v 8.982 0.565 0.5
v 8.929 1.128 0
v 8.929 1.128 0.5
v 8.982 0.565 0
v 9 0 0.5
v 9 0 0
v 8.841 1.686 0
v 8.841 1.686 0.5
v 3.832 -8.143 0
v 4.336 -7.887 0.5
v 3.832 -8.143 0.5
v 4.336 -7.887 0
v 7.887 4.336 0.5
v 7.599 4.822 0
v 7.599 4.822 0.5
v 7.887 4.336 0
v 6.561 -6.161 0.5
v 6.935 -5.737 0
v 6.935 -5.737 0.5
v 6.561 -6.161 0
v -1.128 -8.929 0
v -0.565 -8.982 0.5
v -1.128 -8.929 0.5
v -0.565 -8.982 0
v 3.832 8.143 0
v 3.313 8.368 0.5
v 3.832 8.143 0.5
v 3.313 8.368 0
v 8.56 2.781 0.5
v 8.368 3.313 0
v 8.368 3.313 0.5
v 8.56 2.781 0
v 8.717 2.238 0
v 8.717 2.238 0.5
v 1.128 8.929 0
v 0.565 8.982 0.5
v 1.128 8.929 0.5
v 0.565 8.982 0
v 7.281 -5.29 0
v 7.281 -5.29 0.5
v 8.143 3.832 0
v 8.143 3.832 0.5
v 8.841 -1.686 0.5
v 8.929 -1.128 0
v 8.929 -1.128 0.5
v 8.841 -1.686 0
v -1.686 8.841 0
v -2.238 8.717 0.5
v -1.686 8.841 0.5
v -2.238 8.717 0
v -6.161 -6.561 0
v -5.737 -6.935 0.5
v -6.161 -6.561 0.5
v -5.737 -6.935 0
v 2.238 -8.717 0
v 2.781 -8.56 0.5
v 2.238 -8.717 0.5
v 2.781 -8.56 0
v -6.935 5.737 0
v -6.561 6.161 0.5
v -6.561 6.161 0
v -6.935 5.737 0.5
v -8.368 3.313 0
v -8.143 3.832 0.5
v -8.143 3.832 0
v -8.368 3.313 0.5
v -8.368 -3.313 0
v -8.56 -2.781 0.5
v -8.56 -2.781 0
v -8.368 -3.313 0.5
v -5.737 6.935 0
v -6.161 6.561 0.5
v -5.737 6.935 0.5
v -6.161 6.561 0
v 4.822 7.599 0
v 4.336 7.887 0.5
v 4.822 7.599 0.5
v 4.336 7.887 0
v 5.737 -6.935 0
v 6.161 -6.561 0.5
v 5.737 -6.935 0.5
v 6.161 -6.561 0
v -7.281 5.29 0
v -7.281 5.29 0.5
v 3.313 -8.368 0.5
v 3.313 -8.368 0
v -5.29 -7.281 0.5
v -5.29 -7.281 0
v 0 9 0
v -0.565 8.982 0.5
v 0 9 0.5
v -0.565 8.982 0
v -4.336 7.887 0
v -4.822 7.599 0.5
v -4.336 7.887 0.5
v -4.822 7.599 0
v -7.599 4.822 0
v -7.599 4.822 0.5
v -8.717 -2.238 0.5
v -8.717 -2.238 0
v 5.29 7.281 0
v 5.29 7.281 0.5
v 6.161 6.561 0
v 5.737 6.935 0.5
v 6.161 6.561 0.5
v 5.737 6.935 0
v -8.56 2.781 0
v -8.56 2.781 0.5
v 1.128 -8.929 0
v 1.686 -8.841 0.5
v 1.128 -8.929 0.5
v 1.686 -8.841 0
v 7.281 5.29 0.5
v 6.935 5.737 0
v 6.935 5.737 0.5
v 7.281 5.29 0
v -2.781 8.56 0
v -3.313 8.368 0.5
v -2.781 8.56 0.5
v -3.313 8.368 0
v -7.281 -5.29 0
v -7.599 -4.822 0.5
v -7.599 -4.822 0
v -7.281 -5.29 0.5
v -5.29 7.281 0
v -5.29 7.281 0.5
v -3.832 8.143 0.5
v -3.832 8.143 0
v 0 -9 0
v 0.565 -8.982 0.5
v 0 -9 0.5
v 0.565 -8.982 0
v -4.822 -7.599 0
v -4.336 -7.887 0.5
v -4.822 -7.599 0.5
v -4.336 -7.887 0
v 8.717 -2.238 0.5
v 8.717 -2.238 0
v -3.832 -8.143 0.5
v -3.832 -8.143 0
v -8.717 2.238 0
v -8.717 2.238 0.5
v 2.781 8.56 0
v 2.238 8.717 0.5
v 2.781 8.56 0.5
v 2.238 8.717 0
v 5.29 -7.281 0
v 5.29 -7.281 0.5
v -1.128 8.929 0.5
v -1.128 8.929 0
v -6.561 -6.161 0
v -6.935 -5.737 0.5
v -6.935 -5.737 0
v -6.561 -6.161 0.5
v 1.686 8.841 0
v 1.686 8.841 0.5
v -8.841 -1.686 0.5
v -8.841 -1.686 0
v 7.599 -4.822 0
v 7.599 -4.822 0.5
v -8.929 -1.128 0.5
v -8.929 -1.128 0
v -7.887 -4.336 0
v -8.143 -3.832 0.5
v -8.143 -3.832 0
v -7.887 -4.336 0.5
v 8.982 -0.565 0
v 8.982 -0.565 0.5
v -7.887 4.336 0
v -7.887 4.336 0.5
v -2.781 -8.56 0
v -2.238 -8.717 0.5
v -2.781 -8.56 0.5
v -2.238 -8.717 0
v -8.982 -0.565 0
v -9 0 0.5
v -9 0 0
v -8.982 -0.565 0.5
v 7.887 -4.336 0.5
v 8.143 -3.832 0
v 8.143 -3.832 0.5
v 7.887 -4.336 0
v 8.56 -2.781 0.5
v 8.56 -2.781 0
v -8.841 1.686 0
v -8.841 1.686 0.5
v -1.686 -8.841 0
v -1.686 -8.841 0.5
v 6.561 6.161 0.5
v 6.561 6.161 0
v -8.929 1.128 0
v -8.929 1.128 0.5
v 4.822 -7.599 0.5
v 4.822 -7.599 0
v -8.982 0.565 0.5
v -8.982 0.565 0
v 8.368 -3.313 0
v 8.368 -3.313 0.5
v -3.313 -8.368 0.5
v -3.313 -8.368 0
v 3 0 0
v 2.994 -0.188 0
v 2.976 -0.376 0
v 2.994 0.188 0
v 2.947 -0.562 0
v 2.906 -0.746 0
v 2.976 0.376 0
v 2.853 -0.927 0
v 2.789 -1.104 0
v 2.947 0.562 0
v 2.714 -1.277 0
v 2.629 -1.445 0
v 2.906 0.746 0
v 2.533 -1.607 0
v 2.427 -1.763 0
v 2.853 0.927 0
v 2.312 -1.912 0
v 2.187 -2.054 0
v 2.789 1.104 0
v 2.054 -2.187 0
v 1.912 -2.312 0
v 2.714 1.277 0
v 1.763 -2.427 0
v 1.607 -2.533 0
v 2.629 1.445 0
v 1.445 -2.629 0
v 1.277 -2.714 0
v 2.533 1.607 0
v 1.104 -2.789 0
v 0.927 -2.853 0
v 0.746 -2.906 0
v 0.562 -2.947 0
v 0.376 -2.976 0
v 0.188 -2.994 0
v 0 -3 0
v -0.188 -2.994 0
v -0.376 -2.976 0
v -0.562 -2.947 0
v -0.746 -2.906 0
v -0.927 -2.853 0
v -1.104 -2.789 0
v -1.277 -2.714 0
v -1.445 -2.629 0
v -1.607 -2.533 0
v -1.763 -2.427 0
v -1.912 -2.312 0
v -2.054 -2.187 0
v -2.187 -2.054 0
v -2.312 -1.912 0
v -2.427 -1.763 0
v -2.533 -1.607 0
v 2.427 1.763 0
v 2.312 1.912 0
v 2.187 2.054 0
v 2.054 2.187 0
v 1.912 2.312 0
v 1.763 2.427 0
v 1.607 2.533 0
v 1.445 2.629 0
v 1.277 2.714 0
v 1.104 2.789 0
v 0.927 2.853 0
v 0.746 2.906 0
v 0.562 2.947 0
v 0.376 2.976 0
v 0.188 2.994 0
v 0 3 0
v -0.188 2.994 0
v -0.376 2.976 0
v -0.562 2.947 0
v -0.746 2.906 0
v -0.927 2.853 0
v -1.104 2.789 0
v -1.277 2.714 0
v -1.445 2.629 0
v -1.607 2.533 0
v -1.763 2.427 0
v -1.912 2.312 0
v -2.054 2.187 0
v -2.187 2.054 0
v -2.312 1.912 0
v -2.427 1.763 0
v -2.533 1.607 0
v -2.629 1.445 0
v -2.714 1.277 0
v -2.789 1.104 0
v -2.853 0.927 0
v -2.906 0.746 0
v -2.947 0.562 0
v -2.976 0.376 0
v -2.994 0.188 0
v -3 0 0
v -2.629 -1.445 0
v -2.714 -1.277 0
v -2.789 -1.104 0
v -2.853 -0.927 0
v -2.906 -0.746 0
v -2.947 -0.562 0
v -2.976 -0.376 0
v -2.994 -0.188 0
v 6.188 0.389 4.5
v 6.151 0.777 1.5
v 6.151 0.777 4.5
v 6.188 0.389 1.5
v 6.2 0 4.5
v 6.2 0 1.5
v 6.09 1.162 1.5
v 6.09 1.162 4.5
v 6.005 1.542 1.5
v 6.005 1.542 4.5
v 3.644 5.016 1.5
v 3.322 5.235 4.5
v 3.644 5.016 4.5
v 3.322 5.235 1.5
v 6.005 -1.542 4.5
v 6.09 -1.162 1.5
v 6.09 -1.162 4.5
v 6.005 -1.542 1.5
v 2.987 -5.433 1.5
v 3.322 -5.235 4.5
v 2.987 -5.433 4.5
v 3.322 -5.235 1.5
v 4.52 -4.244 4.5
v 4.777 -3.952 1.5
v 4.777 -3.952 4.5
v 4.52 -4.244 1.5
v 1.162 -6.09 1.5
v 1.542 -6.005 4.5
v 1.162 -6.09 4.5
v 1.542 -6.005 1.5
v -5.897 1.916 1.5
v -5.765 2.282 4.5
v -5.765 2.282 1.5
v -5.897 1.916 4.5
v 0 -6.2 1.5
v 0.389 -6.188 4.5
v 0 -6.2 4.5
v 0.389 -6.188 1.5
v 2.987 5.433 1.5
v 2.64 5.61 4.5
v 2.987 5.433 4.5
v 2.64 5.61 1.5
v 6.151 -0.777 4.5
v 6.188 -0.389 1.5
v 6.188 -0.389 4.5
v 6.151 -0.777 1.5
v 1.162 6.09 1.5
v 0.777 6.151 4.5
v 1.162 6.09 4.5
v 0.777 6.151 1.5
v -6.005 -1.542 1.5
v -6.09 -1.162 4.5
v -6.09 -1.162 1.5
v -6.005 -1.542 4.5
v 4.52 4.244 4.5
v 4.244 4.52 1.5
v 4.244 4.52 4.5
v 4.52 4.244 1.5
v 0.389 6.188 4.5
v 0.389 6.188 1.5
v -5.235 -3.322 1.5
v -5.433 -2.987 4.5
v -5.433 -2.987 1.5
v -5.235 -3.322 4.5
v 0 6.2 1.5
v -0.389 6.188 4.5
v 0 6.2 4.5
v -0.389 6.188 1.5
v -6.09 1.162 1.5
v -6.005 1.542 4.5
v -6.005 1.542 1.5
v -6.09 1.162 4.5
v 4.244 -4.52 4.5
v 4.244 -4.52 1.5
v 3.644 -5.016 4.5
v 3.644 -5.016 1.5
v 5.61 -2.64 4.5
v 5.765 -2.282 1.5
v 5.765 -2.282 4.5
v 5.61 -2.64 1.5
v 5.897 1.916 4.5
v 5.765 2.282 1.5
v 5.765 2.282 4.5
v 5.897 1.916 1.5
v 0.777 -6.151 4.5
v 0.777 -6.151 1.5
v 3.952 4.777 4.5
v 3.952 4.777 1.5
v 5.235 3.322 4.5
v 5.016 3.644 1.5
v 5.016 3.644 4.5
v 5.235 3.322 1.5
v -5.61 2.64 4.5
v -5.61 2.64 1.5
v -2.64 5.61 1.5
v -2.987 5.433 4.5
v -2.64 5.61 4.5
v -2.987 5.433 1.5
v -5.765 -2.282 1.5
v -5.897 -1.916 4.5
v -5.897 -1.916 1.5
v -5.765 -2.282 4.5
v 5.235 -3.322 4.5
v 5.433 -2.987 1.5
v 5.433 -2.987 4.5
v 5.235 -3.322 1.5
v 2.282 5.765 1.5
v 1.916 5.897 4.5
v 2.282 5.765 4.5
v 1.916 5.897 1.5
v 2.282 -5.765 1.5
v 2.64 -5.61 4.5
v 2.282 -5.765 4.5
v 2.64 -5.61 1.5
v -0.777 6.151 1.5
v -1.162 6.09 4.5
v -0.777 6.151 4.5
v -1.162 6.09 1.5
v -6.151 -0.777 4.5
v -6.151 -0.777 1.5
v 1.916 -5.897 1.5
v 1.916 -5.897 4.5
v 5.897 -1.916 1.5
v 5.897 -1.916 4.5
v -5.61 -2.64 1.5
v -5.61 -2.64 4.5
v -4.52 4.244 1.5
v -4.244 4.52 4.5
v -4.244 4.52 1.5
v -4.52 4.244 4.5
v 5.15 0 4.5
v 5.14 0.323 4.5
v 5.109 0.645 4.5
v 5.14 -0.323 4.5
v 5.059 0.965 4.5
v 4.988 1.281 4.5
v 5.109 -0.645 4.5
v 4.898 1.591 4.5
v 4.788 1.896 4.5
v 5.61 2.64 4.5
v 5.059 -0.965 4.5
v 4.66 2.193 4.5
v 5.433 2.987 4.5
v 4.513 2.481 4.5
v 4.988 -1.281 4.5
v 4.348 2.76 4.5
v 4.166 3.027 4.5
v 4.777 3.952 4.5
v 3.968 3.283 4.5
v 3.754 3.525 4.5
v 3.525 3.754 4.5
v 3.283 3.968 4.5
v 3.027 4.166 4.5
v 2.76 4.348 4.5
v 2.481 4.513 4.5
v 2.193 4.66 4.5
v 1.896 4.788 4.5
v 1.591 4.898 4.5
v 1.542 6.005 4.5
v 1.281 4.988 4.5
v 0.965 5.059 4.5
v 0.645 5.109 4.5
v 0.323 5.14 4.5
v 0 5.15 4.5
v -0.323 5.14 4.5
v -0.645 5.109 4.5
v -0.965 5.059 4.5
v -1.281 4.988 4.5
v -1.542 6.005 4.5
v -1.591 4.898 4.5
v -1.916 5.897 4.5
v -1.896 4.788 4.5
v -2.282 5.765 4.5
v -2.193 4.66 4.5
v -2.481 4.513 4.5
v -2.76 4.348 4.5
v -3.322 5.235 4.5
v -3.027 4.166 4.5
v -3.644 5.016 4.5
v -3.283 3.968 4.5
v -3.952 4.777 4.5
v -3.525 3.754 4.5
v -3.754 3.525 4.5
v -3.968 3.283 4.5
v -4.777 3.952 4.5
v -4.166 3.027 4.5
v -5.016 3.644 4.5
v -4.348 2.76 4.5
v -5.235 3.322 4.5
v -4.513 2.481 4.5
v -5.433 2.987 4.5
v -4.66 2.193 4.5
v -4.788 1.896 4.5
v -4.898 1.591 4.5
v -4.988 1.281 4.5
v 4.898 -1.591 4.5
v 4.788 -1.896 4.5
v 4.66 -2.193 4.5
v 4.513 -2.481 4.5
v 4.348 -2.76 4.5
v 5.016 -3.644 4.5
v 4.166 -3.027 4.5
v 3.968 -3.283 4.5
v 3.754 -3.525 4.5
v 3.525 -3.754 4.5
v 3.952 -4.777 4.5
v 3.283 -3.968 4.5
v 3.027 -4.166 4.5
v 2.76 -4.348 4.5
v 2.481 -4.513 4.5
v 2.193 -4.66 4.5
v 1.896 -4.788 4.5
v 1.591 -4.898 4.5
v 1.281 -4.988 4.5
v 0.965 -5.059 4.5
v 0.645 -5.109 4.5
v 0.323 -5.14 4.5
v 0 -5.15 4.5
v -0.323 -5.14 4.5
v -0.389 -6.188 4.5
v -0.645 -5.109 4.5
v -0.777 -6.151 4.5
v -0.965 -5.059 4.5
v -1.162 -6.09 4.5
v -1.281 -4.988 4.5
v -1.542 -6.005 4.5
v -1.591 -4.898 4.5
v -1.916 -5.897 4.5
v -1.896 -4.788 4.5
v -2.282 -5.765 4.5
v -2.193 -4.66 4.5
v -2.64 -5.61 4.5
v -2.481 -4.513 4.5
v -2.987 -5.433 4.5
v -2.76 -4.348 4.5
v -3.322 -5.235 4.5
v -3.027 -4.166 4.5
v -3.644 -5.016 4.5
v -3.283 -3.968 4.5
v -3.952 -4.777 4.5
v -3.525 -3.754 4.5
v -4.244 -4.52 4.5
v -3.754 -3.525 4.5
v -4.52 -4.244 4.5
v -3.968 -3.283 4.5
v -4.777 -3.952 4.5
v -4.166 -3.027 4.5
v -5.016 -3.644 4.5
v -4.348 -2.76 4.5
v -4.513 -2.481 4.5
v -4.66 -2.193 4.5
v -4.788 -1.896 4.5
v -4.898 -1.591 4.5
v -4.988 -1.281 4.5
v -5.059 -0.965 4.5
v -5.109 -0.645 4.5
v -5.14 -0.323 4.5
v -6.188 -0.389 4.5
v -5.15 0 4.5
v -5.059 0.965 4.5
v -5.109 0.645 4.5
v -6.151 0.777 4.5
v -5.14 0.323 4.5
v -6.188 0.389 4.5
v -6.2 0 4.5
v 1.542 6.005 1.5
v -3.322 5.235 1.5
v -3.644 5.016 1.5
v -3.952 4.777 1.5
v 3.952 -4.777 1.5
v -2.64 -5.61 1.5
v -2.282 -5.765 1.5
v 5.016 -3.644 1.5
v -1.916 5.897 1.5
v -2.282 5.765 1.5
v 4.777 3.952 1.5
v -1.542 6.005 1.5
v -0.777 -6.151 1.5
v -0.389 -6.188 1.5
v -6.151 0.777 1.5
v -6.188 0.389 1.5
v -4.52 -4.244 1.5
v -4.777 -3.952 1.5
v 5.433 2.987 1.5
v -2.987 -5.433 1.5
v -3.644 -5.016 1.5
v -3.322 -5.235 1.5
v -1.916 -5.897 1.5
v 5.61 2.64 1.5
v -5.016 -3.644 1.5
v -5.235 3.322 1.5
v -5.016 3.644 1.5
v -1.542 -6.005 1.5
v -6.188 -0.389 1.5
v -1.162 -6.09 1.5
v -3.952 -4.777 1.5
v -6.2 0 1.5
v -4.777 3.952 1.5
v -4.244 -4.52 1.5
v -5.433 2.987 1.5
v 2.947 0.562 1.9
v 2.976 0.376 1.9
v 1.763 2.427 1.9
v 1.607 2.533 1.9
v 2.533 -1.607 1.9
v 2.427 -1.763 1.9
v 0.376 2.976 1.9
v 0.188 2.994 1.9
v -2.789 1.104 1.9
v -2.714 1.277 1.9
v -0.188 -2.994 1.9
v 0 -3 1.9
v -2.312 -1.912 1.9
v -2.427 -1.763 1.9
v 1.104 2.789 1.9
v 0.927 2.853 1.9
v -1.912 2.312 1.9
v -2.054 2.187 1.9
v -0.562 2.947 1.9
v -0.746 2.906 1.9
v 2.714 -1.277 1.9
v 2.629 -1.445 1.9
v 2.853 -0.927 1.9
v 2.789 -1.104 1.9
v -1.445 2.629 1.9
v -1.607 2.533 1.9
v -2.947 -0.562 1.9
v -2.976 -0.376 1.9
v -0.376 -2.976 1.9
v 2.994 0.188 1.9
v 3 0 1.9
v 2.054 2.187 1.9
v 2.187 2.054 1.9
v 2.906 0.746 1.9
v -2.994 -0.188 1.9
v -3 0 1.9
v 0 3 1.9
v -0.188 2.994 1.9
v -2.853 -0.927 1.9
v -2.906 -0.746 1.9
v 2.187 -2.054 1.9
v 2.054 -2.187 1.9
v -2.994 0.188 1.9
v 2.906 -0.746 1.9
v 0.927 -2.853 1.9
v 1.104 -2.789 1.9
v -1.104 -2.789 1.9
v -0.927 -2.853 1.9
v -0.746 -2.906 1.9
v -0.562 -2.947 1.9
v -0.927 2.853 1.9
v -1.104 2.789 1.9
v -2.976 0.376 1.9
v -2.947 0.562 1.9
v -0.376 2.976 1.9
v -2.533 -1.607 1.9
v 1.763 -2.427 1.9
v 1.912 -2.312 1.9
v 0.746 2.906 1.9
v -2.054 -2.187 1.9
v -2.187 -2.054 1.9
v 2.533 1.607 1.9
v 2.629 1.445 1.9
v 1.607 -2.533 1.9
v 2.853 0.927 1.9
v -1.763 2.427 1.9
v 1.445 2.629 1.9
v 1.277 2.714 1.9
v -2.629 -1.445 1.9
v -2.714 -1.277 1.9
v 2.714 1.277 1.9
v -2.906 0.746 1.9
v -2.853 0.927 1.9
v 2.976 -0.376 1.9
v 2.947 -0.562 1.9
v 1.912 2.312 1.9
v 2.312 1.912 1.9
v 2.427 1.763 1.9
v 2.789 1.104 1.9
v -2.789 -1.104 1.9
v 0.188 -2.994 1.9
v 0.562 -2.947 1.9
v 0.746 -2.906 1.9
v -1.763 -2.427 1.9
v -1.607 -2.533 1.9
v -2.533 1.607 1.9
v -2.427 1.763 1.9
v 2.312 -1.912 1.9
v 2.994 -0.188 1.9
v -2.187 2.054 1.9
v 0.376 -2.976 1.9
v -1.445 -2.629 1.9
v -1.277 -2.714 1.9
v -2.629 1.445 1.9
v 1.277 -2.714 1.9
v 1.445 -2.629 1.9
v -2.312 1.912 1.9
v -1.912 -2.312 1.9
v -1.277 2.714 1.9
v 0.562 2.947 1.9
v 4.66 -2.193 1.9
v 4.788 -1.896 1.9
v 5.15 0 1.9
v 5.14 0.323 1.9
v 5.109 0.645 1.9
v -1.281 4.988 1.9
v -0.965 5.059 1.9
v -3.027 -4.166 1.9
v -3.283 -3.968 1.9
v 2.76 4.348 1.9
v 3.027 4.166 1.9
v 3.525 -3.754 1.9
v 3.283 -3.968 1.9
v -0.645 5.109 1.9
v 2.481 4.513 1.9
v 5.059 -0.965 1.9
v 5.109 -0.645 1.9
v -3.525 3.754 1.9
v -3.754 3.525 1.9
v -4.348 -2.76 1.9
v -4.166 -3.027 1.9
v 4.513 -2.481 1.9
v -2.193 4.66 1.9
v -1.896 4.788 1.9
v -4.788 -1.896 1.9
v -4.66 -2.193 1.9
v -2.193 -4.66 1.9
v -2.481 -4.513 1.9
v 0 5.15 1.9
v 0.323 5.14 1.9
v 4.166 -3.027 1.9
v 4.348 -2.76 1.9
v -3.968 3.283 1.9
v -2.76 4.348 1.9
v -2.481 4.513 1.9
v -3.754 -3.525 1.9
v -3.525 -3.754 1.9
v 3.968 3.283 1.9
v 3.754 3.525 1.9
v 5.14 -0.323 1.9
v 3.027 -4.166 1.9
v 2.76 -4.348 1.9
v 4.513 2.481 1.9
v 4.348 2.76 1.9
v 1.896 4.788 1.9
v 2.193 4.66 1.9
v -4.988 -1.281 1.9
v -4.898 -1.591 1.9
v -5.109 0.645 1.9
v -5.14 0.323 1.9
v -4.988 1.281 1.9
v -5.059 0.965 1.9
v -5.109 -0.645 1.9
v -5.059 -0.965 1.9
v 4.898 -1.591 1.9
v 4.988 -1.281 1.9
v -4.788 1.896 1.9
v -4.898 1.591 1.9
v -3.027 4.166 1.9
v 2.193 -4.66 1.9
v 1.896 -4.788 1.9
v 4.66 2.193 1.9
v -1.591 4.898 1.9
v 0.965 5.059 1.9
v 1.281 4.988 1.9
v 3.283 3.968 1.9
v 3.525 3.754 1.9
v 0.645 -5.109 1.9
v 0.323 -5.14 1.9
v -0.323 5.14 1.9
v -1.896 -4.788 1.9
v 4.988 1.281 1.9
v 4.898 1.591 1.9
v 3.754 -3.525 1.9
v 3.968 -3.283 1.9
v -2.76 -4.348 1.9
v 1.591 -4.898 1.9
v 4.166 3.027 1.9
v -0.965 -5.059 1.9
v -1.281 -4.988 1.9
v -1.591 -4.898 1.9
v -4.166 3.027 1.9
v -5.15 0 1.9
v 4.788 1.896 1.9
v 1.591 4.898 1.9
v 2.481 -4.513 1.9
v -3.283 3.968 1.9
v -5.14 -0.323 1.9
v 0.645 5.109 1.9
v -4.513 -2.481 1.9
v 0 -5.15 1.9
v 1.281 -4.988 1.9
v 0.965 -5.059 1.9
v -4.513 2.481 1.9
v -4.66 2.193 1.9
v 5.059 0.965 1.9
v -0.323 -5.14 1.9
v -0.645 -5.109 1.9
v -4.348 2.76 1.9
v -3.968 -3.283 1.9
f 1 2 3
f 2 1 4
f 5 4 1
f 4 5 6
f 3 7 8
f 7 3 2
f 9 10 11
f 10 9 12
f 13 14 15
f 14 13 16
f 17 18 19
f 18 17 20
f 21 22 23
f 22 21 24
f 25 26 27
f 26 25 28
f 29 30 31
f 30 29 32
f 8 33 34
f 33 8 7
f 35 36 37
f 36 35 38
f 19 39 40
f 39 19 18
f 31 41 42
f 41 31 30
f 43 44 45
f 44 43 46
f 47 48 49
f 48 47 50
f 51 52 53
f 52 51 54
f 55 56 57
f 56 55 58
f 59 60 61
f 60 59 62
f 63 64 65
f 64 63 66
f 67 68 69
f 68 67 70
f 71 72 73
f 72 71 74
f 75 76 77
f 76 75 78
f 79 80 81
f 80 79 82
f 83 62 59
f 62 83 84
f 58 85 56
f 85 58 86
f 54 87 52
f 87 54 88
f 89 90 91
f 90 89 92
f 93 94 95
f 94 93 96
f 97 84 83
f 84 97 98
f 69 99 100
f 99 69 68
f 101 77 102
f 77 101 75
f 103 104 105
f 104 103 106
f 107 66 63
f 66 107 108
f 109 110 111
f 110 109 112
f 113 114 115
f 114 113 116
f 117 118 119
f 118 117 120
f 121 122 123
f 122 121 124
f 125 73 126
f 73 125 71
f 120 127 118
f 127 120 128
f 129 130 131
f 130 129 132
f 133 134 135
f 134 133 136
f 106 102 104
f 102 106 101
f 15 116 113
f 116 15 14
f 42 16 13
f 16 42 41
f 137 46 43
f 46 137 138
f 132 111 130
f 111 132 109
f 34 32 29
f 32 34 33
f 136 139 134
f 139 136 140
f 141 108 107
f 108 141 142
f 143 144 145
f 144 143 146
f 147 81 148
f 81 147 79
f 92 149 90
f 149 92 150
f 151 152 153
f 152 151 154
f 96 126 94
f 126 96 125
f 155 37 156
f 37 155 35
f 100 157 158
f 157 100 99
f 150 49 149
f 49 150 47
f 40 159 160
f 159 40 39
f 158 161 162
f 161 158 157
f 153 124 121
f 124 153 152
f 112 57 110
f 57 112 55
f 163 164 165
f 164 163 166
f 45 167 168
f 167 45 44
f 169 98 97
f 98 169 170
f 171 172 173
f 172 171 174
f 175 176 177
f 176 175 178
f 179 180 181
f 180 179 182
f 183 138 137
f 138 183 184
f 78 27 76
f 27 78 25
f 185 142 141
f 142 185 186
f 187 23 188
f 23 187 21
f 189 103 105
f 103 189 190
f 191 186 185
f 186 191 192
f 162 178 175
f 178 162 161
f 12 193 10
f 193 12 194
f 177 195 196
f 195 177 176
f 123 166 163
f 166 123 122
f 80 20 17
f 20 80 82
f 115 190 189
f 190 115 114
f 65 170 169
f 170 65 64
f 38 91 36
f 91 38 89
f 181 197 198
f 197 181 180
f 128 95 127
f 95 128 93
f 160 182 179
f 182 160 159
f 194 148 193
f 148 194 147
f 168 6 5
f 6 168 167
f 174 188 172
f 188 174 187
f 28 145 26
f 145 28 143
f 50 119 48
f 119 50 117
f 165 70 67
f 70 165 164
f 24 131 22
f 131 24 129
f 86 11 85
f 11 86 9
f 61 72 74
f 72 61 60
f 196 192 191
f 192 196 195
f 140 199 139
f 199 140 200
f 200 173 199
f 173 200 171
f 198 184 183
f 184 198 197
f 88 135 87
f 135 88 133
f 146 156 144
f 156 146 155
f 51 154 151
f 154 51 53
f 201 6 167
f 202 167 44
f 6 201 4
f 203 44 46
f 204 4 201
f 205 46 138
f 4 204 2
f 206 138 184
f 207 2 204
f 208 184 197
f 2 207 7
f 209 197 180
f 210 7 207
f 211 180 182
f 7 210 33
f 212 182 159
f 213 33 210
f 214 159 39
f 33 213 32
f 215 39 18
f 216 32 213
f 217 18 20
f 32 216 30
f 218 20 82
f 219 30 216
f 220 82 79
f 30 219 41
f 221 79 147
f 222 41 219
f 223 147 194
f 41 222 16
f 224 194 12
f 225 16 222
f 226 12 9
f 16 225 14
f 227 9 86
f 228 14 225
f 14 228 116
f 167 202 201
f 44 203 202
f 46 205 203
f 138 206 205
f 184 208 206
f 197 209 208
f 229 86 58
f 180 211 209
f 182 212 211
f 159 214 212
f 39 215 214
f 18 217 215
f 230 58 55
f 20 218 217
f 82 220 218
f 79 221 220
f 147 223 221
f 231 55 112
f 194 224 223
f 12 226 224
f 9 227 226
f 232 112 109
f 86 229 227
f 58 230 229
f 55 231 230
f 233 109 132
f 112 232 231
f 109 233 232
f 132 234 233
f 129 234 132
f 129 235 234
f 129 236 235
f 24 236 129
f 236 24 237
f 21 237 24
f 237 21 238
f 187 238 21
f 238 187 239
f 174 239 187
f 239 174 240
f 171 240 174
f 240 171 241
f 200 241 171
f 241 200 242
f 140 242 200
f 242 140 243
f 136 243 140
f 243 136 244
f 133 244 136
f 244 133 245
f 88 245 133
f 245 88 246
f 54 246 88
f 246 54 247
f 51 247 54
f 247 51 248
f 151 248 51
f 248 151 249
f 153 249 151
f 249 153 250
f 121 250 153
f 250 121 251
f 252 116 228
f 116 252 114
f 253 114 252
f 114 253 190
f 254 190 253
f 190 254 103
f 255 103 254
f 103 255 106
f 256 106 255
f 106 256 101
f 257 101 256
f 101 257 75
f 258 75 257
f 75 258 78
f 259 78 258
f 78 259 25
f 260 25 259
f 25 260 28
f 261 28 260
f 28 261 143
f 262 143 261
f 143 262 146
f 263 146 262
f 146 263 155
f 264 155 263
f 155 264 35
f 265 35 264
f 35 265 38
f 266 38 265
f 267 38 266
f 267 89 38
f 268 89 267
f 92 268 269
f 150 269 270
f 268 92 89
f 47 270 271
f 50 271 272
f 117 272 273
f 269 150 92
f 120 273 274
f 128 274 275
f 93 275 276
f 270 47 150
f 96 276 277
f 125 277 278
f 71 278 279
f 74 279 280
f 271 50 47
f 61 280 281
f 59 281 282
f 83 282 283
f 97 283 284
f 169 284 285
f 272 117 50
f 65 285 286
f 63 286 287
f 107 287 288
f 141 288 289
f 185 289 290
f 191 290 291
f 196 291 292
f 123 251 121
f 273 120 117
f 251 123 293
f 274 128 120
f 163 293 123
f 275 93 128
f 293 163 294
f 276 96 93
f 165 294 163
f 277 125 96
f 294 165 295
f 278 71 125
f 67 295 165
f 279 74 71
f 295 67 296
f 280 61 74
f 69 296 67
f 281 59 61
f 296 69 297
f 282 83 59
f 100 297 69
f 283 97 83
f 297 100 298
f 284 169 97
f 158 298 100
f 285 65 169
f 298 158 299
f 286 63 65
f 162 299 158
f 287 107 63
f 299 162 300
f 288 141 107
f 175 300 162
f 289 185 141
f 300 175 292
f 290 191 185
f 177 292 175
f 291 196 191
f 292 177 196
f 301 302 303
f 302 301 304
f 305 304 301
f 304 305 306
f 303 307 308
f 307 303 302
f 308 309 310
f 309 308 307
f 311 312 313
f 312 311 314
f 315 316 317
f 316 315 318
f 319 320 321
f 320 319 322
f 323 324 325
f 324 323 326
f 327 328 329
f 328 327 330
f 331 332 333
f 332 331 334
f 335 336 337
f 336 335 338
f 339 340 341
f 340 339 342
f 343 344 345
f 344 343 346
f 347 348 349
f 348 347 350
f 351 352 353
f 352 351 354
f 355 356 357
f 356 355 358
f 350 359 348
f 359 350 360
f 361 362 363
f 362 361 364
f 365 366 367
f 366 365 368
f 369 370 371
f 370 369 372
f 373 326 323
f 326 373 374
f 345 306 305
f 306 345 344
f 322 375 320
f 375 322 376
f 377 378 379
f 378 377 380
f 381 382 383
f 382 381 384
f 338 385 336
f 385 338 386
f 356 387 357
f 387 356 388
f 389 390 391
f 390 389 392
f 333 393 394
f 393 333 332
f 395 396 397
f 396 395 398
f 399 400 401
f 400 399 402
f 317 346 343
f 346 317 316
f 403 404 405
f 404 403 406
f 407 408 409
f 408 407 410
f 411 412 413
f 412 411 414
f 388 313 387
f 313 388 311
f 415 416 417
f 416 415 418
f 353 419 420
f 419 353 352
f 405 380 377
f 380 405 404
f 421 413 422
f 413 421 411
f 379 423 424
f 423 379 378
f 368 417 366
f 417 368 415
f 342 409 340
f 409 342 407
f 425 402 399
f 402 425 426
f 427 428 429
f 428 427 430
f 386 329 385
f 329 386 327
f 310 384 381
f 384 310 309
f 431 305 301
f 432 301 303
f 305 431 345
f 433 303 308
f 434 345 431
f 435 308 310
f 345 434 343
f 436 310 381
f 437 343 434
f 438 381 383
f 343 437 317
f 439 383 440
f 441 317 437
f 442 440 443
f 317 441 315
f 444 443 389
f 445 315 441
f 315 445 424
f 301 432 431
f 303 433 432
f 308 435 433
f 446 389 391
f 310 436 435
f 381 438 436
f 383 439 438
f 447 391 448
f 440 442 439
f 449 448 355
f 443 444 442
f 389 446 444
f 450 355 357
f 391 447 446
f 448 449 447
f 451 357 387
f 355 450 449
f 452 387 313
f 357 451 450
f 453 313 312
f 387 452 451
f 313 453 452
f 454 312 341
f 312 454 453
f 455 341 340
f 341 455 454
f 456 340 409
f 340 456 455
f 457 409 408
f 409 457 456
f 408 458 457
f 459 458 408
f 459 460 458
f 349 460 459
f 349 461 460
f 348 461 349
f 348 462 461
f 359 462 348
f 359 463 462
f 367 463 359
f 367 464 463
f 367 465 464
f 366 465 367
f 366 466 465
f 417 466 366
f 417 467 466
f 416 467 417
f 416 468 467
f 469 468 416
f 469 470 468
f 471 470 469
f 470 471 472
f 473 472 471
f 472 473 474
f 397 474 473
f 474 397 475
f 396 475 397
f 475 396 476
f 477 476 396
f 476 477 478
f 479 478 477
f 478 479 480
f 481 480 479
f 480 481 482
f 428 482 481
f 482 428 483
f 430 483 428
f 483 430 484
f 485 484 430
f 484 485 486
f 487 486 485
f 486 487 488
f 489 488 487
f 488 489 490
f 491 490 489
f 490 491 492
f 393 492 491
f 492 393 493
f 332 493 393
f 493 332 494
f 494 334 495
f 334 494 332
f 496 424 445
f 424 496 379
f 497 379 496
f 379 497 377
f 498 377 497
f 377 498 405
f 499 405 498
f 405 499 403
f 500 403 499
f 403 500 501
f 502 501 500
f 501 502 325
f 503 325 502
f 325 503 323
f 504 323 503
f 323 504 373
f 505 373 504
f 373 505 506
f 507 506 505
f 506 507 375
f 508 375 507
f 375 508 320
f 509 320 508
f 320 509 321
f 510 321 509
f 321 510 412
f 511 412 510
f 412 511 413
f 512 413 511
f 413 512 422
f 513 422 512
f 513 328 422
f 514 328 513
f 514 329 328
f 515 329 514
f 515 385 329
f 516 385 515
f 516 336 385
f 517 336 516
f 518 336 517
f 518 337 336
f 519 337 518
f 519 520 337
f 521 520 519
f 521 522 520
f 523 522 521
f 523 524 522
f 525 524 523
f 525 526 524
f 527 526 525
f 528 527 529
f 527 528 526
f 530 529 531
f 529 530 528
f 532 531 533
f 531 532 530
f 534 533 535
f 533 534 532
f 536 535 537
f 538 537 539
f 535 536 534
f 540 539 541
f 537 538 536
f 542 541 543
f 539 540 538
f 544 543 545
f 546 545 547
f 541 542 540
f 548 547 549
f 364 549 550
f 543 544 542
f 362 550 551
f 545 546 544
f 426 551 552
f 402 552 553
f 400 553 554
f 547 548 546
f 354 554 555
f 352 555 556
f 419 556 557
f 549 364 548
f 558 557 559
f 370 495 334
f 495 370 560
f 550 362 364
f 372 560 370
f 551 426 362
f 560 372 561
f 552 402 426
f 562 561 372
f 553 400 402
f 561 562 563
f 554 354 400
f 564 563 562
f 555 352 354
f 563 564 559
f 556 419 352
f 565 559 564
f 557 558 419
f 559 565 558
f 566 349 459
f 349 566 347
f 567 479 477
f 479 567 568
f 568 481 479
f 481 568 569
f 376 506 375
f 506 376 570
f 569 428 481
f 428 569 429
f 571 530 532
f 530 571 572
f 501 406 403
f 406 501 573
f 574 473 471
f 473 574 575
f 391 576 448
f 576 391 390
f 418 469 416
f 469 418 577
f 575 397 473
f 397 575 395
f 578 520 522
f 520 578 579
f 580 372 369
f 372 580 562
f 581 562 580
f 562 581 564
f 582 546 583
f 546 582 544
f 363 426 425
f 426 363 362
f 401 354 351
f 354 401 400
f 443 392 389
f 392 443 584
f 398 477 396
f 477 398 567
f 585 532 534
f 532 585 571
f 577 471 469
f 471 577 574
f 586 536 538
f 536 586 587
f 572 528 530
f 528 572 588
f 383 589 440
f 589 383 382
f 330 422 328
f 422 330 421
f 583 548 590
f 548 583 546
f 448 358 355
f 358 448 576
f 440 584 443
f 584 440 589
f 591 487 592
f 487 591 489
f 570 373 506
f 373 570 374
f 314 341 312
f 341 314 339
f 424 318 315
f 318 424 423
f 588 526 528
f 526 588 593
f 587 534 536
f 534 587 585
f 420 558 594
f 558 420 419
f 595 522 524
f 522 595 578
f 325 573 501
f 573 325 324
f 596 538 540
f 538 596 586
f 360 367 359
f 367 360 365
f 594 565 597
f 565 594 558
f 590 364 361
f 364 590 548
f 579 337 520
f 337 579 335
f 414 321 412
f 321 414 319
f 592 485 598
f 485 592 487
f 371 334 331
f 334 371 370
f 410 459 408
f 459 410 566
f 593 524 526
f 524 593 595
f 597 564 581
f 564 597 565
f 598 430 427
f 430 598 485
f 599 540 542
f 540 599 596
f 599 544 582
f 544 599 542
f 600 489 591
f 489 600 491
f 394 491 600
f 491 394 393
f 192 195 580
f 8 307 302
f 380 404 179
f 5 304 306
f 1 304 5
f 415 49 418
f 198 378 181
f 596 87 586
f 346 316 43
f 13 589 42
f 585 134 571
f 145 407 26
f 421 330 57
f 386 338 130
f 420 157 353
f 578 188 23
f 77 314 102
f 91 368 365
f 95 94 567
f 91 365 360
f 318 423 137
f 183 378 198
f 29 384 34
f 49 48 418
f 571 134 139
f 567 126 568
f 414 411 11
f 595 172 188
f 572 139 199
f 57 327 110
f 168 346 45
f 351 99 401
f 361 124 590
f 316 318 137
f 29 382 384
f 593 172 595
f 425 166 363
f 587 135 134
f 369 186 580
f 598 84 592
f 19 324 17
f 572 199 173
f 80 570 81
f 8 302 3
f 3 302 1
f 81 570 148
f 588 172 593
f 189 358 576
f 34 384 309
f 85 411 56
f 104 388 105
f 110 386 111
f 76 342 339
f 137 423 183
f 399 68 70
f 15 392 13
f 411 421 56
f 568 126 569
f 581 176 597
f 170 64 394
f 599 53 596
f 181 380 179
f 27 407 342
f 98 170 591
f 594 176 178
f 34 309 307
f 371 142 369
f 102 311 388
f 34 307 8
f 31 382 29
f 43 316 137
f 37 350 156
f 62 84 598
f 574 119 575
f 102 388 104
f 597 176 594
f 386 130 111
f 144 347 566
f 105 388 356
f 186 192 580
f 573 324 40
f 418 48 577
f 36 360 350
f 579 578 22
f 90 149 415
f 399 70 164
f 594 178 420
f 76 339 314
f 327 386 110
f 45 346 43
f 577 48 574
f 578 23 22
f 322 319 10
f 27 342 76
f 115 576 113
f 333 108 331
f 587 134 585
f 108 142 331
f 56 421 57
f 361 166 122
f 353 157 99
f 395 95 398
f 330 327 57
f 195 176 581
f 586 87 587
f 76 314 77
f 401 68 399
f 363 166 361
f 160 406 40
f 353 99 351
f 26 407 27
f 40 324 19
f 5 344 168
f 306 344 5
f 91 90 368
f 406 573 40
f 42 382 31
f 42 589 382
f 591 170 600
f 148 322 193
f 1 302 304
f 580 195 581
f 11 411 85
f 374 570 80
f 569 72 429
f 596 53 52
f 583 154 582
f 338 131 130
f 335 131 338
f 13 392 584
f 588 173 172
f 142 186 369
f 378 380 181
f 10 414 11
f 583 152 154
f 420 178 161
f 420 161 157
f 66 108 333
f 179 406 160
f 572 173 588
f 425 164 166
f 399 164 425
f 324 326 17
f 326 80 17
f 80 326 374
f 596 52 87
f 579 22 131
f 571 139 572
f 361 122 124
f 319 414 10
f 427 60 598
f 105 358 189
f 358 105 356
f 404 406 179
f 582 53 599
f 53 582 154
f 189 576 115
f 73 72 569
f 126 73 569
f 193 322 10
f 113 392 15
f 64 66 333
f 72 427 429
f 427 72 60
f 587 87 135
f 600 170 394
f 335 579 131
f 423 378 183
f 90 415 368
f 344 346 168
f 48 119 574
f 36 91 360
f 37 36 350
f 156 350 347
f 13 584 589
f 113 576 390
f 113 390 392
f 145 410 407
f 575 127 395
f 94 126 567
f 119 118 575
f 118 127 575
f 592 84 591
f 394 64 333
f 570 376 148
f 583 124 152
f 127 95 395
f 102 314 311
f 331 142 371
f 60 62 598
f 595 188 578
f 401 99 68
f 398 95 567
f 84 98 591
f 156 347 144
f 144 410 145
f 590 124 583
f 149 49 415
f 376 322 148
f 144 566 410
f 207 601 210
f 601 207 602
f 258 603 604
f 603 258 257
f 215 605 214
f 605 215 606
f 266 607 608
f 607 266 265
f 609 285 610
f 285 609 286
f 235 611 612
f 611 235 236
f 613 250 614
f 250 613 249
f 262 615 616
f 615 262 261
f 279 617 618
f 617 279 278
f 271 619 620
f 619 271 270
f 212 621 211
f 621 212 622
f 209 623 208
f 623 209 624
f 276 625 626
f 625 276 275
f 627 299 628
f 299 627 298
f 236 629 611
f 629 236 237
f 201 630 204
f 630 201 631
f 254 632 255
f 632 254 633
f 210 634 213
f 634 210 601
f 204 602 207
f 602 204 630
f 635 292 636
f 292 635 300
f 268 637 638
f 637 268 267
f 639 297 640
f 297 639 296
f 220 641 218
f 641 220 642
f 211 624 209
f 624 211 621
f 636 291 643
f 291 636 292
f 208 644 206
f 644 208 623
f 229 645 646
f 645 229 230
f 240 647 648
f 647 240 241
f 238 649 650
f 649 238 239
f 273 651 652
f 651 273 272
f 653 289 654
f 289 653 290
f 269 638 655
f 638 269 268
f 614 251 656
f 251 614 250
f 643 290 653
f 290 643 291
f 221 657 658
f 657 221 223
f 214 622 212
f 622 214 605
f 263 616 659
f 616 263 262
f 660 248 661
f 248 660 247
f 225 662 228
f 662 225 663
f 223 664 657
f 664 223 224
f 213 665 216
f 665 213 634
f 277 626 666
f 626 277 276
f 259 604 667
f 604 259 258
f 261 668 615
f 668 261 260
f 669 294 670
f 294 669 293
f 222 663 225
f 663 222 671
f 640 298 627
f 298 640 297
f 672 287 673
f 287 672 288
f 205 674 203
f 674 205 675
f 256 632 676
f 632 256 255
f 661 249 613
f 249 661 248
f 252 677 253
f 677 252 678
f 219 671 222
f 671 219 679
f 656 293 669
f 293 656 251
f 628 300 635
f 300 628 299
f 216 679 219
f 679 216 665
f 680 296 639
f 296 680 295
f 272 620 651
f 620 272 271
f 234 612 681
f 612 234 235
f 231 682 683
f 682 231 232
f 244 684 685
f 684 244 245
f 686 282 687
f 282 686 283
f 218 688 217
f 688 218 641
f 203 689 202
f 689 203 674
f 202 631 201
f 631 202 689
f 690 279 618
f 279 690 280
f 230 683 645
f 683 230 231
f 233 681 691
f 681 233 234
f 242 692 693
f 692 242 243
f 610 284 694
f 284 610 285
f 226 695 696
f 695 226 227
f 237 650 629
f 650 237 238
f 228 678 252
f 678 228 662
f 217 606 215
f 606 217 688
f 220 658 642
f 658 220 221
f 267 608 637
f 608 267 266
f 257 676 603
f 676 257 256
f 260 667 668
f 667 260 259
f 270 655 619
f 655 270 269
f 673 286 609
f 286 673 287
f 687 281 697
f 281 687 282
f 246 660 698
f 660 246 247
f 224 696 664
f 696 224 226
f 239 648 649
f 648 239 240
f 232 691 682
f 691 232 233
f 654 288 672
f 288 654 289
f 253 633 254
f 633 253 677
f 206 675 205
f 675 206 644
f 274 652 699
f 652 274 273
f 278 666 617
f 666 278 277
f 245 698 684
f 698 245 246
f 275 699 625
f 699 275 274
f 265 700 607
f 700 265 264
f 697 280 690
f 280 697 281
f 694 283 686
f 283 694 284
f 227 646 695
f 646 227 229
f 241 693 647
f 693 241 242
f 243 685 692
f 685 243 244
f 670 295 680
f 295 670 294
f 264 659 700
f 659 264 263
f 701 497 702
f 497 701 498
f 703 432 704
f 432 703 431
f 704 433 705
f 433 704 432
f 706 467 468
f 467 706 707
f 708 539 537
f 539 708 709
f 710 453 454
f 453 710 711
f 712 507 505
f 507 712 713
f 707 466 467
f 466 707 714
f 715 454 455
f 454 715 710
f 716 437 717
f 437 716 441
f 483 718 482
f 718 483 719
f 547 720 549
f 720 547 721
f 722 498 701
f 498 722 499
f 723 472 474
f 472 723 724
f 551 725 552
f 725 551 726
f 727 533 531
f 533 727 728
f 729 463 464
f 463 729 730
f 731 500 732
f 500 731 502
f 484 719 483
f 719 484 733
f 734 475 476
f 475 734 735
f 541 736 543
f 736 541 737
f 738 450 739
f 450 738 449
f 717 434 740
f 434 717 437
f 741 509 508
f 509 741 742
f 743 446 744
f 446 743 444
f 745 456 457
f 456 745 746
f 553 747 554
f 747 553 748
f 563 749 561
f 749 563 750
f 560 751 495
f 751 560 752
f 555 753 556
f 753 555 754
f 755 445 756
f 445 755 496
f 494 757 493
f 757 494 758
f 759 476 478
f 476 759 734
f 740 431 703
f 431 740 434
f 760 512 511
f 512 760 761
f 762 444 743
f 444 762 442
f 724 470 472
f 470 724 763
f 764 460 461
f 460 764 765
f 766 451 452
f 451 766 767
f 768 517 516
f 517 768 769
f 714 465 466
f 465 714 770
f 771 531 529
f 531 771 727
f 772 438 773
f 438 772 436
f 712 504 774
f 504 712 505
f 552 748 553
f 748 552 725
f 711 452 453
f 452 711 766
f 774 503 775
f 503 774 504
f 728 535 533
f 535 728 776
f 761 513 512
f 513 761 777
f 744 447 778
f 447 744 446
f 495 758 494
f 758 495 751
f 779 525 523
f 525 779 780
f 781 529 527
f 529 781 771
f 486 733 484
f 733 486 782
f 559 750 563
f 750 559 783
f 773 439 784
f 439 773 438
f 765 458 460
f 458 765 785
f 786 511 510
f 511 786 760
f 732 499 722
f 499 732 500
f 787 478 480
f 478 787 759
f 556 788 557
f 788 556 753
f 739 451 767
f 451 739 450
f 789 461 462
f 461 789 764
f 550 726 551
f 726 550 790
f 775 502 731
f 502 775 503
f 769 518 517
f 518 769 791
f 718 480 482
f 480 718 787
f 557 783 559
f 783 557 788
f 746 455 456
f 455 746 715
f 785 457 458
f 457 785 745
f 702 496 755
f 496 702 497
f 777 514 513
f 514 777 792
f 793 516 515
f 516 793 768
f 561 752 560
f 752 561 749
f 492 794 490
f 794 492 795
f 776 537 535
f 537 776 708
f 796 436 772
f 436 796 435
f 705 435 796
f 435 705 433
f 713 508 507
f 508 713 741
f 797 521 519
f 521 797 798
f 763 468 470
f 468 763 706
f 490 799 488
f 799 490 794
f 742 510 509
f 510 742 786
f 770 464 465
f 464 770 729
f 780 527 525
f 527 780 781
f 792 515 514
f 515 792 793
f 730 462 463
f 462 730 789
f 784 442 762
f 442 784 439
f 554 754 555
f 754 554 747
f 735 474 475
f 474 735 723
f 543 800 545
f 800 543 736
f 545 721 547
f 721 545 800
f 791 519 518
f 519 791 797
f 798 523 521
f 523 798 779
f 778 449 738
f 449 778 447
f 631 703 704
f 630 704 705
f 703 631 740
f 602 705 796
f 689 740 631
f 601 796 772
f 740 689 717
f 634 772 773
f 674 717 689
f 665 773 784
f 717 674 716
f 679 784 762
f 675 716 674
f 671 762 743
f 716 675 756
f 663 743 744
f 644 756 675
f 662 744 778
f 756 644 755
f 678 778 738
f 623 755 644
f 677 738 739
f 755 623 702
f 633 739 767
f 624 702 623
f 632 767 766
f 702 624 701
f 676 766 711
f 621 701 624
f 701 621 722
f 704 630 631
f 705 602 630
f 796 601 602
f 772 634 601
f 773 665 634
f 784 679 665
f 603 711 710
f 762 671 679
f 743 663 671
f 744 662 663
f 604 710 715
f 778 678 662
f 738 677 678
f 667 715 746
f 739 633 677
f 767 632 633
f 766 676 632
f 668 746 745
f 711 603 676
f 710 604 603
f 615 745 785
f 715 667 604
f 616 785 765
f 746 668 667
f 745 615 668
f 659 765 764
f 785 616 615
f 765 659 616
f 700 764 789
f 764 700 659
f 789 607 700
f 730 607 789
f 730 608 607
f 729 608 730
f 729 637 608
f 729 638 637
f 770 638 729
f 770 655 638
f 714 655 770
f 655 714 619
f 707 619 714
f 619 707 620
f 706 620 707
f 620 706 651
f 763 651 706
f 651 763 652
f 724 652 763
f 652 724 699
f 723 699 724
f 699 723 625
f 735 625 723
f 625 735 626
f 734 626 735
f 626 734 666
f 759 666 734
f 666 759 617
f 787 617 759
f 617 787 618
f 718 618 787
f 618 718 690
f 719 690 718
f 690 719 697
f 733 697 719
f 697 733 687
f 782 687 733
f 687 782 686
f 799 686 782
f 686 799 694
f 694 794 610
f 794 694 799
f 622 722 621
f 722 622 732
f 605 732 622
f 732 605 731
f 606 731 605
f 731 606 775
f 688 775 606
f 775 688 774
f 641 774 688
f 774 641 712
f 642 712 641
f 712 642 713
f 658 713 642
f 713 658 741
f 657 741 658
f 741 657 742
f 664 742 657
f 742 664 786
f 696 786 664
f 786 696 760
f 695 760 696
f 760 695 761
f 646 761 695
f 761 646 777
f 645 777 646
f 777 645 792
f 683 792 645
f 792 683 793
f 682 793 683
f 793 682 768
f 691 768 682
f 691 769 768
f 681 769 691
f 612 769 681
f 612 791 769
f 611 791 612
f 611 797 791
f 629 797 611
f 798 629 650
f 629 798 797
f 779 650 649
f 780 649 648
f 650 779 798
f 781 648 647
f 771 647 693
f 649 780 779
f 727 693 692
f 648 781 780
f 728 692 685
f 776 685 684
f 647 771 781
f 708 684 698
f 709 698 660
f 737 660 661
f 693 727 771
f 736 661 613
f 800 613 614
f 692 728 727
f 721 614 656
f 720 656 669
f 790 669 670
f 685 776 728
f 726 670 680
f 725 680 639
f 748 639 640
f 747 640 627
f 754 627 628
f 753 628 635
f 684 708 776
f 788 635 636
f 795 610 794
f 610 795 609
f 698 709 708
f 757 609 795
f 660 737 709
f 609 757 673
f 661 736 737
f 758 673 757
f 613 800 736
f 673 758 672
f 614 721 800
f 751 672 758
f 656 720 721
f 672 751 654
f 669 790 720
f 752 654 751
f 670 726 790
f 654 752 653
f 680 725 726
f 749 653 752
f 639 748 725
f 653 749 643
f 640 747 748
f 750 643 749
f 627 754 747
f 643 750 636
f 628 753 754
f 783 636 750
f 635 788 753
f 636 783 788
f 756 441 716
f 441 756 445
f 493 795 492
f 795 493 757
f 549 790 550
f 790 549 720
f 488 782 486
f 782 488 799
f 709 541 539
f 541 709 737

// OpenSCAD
// Created from Code_Pulley_623 (x4).stl
// https://github.com/Mecan0/Code
// By J.Rodigo (www.jra.so)
// Licence Creative commons atribution & share alike.

/**************************/
// Parámetros de la pieza  /
/**************************/

dCoji = 10.3;	// Diámetro  del cojinete (10.3)
hCoji = 5.2;	// Anchura del cojinete (5.2)
dEje = 6;		// Diámetro del eje (6)
dPolea = 18;	// Diámetro externo de la polea
hCorrea = 6;	// Anchura de la correa (6)

// Media polea para un cojinete
module Polea(){
	difference () {
		union() {
			// Cilindro - Base
			cylinder (h = 0.5, r = dPolea/2, $fn=100);
			// Cilindro - Canal para la correa
			translate([0, 0, 0.5])
			cylinder (h = 4, r = (dCoji/2)+1.05, $fn=100);
			//	Chaflán entre la Base y el Canal
			translate([0, 0, 0.5])
			cylinder(h = 4-(hCorrea/2), r1 = dPolea/2, r2 = (dCoji/2)+1.05, $fn=100);
		}	
		union() {
			// Taladro del eje
			translate([0, 0, -1])
			cylinder (h = 5, r = dEje/2, $fn=100);
			// Taladro del cojinete
			translate([0, 0, 4.5-hCoji/2])
			cylinder (h = 5, r = dCoji/2, $fn=100);
		}	
	 
	}
}

// Generamos la pieza
Polea();
